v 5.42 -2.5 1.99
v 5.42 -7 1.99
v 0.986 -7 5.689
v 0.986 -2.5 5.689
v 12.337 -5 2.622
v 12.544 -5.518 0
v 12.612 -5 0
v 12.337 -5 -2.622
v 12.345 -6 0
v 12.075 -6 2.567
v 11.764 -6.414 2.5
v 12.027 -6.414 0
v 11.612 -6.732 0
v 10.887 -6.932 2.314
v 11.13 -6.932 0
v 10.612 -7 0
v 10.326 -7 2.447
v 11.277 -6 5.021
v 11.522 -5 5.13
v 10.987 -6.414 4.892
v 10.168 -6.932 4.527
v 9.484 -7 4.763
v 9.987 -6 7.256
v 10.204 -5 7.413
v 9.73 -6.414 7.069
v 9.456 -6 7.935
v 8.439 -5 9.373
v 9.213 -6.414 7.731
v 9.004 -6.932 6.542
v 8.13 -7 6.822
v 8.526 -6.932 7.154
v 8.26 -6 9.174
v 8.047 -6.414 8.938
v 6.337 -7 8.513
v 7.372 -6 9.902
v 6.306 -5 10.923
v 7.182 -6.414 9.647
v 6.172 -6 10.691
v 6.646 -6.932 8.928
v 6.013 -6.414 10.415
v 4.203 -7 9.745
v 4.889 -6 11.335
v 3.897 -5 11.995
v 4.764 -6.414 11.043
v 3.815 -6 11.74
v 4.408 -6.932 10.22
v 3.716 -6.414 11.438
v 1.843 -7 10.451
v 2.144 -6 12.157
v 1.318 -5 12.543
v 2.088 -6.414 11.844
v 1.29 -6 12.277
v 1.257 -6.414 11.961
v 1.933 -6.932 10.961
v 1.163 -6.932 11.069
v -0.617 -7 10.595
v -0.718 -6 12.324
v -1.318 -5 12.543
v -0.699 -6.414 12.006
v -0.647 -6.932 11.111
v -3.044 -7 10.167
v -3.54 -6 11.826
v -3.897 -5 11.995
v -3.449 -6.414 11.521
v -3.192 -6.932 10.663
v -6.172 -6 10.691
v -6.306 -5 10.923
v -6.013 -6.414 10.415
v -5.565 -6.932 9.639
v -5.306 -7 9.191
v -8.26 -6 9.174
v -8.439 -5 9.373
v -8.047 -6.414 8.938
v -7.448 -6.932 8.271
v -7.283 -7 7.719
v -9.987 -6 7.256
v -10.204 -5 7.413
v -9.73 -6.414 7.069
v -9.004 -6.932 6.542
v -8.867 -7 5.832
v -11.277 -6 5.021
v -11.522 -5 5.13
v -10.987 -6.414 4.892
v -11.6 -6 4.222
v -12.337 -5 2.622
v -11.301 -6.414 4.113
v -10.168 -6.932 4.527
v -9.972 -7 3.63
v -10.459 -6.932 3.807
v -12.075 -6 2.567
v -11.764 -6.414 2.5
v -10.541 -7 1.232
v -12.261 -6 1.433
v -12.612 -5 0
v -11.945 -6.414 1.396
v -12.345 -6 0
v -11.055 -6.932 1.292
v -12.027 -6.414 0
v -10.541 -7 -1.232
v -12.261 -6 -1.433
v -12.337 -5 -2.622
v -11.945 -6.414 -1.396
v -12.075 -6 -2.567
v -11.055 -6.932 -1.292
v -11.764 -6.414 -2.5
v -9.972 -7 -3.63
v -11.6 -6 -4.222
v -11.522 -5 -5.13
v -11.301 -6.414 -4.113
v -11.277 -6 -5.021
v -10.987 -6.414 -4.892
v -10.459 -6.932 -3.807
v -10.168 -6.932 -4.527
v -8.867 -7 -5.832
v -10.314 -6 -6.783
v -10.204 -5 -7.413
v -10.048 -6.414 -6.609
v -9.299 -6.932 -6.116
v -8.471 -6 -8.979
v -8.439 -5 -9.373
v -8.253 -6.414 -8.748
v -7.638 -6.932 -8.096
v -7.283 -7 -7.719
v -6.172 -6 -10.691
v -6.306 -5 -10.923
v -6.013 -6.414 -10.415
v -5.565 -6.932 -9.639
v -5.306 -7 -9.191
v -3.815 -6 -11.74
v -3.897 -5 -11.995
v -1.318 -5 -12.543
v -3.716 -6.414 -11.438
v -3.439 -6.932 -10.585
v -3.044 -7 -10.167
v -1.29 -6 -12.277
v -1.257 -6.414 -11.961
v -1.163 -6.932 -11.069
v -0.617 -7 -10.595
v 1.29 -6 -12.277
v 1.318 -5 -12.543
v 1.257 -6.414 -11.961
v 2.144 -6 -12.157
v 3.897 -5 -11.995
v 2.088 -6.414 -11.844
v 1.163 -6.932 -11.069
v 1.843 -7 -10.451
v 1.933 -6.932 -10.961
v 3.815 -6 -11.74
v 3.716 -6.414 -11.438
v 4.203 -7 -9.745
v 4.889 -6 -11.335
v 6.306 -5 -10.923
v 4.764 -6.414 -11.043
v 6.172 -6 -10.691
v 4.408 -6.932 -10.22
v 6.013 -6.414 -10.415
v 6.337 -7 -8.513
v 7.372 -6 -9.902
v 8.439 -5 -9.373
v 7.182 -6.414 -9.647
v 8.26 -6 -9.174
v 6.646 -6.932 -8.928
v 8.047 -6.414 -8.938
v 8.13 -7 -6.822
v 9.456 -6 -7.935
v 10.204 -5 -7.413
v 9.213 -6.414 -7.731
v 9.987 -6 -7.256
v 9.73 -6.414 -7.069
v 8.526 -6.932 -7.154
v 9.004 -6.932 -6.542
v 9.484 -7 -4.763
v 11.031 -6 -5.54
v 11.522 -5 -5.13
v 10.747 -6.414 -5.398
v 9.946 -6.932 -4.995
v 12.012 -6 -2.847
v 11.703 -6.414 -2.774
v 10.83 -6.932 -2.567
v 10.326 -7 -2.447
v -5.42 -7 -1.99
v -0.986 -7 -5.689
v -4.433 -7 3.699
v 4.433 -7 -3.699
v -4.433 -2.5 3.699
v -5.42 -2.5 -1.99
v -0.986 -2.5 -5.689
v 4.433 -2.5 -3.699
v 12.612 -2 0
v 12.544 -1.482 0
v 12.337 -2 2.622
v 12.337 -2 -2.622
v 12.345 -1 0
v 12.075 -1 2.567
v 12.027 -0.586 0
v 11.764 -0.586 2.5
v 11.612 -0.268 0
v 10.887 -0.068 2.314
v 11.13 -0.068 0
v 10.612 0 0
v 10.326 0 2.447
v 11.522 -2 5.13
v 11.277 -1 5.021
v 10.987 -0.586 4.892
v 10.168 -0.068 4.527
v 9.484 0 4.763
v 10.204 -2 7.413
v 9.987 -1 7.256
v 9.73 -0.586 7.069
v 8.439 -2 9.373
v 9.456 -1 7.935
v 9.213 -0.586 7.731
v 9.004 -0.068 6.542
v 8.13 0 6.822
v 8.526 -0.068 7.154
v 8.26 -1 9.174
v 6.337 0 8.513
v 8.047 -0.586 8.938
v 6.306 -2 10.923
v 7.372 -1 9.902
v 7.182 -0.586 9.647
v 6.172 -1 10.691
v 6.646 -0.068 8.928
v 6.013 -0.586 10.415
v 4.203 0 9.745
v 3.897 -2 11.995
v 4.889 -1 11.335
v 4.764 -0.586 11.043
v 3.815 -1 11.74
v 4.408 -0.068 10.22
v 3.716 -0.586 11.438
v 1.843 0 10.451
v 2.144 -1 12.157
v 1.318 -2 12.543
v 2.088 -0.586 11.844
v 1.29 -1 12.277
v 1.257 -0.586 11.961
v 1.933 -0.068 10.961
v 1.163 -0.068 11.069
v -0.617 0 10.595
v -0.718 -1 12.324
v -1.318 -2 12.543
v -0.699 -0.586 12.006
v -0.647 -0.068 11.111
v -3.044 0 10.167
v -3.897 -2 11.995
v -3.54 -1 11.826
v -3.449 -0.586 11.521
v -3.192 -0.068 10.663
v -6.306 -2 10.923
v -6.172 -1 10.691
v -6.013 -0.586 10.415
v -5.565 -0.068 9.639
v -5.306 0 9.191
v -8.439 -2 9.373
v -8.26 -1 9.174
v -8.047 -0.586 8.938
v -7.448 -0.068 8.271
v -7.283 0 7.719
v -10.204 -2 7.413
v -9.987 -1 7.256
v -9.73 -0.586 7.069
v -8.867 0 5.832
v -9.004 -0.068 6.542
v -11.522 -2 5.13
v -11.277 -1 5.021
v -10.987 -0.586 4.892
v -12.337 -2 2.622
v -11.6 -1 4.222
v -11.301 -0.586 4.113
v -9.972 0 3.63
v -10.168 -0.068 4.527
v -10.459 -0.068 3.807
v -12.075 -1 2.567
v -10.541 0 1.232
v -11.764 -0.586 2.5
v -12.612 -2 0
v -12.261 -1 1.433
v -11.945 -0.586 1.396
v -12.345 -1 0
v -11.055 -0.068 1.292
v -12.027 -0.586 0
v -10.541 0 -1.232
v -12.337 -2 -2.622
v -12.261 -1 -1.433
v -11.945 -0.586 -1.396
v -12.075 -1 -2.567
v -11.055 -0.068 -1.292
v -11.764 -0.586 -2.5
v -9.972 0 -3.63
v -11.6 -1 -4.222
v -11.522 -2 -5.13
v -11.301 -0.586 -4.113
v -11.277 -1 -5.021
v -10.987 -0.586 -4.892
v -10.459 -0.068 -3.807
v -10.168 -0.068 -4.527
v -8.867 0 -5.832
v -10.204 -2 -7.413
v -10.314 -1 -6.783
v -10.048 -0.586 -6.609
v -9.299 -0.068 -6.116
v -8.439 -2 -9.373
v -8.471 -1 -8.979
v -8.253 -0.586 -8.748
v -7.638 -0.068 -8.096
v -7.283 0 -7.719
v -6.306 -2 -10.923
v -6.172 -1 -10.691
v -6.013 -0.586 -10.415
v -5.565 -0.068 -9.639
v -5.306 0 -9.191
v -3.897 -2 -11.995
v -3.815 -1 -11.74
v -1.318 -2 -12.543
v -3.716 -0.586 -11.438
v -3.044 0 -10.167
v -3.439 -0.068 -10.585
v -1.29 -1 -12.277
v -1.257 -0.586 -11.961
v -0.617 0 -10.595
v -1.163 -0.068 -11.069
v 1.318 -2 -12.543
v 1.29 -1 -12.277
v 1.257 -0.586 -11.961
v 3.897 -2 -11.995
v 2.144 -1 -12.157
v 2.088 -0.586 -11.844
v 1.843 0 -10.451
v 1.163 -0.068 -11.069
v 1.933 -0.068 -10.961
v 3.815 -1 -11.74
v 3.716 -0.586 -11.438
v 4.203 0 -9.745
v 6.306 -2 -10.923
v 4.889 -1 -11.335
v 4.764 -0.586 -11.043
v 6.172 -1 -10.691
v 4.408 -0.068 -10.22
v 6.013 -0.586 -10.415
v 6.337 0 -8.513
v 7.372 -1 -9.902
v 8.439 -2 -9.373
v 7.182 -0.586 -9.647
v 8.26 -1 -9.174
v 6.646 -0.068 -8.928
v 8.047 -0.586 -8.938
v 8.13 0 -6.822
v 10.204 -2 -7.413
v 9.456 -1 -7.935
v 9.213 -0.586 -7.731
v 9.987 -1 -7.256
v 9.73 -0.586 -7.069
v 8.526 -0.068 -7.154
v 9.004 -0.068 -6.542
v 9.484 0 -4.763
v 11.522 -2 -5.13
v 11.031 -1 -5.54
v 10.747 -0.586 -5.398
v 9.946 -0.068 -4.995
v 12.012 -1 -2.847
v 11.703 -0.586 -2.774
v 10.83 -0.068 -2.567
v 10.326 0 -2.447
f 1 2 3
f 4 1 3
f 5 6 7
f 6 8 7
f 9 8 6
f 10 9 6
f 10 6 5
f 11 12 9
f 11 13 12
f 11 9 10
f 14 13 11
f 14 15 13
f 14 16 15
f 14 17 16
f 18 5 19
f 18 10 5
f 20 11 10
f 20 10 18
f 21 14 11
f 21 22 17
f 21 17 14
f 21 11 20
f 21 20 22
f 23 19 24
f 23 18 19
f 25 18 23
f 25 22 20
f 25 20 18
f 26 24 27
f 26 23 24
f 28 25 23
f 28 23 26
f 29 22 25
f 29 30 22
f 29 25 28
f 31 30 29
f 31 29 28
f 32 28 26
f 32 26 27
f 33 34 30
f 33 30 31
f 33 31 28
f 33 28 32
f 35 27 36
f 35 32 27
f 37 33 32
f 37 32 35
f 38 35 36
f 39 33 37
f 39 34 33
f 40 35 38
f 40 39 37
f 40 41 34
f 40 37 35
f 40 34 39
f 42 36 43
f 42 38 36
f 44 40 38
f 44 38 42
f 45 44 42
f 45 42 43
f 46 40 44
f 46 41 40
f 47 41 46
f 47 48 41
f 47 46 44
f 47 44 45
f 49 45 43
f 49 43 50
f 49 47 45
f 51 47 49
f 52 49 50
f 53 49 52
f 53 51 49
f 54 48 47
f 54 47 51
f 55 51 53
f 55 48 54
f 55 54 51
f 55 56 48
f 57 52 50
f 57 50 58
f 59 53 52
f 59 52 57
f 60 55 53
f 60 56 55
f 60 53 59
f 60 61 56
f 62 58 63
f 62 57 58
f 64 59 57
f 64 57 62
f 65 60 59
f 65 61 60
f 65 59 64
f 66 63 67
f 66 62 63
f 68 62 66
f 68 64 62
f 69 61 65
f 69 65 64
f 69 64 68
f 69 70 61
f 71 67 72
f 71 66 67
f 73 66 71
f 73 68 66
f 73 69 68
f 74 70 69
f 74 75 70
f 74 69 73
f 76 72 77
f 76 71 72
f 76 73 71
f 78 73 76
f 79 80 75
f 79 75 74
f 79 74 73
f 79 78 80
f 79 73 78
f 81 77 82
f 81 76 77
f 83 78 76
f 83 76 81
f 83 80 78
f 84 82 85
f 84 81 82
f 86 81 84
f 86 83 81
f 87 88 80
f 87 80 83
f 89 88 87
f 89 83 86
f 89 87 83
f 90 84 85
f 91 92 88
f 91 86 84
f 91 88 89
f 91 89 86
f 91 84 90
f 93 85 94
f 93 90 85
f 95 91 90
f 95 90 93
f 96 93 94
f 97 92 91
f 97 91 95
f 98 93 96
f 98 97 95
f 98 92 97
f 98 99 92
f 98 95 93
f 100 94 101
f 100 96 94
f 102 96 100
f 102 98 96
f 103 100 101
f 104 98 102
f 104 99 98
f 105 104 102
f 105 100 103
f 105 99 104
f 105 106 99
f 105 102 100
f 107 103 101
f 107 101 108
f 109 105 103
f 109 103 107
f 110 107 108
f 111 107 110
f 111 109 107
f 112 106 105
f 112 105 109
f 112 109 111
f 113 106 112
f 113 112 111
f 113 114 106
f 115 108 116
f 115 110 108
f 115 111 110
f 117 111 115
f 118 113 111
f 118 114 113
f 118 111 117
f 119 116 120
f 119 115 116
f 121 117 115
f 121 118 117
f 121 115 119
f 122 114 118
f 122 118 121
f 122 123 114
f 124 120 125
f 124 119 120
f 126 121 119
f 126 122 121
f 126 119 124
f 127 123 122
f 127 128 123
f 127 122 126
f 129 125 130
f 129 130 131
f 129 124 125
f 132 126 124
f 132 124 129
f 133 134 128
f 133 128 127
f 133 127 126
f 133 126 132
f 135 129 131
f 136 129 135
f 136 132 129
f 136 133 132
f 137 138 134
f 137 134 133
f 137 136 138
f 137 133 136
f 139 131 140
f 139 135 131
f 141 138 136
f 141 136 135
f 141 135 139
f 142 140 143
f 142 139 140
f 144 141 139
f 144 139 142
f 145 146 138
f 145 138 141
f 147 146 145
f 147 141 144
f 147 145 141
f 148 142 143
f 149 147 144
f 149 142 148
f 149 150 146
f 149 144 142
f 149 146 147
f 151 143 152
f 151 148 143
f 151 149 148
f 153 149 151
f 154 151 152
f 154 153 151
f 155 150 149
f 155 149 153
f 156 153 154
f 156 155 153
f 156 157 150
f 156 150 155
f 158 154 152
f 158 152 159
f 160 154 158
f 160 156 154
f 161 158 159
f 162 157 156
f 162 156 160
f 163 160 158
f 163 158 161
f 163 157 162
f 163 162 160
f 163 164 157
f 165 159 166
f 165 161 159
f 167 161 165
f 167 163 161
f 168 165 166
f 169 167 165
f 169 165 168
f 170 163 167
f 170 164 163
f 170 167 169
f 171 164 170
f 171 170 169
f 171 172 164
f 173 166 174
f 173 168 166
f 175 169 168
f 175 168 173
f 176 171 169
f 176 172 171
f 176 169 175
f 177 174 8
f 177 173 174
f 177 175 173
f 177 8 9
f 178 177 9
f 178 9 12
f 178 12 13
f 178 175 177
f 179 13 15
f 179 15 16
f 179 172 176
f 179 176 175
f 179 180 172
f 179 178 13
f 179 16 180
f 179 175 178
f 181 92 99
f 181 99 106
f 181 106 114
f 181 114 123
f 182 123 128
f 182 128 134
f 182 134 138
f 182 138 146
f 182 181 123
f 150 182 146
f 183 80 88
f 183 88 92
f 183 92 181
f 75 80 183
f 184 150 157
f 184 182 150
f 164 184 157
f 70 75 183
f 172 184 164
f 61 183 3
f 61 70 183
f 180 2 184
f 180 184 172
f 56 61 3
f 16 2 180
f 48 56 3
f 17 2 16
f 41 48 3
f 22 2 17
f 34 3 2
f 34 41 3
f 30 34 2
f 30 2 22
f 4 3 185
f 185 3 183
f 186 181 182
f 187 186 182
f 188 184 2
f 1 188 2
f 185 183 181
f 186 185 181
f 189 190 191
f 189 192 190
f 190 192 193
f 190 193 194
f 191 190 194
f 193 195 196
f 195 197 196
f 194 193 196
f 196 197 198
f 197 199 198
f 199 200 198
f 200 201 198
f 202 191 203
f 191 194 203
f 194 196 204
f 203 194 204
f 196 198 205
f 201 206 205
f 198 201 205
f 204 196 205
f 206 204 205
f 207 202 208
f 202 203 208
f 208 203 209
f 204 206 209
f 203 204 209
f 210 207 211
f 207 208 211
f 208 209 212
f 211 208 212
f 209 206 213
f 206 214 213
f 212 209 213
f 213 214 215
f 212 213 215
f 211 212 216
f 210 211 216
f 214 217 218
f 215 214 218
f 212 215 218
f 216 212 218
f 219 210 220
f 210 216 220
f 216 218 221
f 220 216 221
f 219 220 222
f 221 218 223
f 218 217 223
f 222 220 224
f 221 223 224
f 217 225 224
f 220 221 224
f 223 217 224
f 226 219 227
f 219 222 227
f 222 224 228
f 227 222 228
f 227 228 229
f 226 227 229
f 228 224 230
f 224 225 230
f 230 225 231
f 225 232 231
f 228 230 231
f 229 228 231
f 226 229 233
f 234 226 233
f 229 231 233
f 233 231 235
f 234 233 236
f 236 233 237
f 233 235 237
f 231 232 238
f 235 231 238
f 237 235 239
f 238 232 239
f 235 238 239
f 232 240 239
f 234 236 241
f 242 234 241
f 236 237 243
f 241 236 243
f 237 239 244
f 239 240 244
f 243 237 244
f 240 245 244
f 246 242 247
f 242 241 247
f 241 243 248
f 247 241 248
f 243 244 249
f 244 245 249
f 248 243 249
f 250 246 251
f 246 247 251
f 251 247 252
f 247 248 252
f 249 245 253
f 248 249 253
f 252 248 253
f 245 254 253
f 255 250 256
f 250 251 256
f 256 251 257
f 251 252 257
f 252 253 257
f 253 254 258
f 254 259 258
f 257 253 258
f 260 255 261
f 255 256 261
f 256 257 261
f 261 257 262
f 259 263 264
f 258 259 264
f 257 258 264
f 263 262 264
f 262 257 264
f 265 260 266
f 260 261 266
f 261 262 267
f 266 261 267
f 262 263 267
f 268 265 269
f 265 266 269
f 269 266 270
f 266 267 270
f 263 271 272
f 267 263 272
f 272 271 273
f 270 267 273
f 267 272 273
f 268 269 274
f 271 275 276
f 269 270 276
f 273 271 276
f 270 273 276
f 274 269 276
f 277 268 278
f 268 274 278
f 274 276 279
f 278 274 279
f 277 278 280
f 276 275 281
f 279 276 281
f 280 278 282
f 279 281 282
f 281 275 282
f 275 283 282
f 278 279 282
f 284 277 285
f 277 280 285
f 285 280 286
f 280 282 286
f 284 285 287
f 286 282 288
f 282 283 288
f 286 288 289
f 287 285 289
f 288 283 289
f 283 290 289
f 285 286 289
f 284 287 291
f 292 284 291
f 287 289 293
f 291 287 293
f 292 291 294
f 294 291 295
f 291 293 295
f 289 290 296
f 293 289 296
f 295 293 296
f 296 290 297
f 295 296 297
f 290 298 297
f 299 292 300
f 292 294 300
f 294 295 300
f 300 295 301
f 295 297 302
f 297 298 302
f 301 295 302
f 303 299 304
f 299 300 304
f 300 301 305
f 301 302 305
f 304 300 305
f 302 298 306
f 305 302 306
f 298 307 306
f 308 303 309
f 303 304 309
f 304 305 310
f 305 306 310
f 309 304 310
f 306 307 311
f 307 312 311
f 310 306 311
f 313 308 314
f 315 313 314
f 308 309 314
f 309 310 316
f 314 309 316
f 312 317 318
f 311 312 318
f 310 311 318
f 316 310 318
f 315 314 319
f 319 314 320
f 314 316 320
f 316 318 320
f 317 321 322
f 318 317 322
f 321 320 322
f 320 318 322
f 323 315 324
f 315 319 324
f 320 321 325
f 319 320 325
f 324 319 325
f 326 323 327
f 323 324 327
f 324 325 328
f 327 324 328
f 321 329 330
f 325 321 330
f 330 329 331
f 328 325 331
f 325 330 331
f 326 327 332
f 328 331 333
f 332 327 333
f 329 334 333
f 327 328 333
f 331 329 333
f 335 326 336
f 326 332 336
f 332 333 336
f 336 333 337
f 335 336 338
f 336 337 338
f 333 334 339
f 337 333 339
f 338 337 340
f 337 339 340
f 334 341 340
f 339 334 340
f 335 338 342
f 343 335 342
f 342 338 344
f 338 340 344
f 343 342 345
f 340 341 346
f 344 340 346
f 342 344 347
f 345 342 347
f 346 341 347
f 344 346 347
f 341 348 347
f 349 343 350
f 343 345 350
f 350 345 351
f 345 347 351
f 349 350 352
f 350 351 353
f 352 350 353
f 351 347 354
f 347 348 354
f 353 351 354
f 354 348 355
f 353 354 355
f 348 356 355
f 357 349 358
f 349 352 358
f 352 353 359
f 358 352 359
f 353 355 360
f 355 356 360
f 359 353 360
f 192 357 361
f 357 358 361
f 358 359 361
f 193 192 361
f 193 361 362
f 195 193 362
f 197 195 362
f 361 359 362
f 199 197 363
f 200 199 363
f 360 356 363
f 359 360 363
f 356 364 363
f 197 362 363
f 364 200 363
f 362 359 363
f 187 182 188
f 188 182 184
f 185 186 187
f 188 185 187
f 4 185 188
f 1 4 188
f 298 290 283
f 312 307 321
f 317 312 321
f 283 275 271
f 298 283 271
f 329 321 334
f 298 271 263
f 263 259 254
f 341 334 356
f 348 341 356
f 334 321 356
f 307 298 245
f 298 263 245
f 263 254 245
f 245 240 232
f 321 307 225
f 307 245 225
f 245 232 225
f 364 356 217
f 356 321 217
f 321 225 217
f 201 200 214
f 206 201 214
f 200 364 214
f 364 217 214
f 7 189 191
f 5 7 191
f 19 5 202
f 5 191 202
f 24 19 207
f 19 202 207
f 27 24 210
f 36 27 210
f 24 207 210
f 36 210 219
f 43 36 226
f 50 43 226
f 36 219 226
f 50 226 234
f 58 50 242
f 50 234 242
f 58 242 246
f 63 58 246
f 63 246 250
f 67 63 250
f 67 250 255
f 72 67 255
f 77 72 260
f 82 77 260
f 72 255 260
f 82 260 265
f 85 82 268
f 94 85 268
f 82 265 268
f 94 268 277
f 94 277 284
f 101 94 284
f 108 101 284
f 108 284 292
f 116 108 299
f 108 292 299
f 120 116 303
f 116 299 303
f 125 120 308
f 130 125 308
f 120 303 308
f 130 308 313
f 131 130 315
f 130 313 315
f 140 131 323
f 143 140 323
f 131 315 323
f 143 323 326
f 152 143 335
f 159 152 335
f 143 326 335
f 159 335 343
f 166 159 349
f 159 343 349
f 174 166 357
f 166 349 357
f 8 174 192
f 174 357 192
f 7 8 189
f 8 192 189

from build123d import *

# Parameters (mm, degrees)
F0_R     = 12.612488
F1_DEPTH = 7
F3_DEPTH = 4.5
F4_R     = 2


with BuildPart() as f1:
    # F0 (on Front) → F1 (new body)
    with BuildSketch(Plane.XZ):
        Circle(F0_R)
    extrude(amount=F1_DEPTH)

    # F2 (on face) → F3 (cut)
    with BuildSketch(Plane.XZ.offset(7)):
        Polygon((4.433325, -3.698508), (5.419665, 1.990118), (0.98634, 5.688626), (-4.433325, 3.698508), (-5.419665, -1.990118), (-0.98634, -5.688626), align=None)
    extrude(amount=-F3_DEPTH, mode=Mode.SUBTRACT)

    # F4
    f4_edges = [f1.edges().sort_by_distance(p)[0] for p in [
        (-12.612488, -7, 0),
        (-12.612488, 0, 0),
    ]]
    fillet(f4_edges, radius=F4_R)


solid = f1.part
